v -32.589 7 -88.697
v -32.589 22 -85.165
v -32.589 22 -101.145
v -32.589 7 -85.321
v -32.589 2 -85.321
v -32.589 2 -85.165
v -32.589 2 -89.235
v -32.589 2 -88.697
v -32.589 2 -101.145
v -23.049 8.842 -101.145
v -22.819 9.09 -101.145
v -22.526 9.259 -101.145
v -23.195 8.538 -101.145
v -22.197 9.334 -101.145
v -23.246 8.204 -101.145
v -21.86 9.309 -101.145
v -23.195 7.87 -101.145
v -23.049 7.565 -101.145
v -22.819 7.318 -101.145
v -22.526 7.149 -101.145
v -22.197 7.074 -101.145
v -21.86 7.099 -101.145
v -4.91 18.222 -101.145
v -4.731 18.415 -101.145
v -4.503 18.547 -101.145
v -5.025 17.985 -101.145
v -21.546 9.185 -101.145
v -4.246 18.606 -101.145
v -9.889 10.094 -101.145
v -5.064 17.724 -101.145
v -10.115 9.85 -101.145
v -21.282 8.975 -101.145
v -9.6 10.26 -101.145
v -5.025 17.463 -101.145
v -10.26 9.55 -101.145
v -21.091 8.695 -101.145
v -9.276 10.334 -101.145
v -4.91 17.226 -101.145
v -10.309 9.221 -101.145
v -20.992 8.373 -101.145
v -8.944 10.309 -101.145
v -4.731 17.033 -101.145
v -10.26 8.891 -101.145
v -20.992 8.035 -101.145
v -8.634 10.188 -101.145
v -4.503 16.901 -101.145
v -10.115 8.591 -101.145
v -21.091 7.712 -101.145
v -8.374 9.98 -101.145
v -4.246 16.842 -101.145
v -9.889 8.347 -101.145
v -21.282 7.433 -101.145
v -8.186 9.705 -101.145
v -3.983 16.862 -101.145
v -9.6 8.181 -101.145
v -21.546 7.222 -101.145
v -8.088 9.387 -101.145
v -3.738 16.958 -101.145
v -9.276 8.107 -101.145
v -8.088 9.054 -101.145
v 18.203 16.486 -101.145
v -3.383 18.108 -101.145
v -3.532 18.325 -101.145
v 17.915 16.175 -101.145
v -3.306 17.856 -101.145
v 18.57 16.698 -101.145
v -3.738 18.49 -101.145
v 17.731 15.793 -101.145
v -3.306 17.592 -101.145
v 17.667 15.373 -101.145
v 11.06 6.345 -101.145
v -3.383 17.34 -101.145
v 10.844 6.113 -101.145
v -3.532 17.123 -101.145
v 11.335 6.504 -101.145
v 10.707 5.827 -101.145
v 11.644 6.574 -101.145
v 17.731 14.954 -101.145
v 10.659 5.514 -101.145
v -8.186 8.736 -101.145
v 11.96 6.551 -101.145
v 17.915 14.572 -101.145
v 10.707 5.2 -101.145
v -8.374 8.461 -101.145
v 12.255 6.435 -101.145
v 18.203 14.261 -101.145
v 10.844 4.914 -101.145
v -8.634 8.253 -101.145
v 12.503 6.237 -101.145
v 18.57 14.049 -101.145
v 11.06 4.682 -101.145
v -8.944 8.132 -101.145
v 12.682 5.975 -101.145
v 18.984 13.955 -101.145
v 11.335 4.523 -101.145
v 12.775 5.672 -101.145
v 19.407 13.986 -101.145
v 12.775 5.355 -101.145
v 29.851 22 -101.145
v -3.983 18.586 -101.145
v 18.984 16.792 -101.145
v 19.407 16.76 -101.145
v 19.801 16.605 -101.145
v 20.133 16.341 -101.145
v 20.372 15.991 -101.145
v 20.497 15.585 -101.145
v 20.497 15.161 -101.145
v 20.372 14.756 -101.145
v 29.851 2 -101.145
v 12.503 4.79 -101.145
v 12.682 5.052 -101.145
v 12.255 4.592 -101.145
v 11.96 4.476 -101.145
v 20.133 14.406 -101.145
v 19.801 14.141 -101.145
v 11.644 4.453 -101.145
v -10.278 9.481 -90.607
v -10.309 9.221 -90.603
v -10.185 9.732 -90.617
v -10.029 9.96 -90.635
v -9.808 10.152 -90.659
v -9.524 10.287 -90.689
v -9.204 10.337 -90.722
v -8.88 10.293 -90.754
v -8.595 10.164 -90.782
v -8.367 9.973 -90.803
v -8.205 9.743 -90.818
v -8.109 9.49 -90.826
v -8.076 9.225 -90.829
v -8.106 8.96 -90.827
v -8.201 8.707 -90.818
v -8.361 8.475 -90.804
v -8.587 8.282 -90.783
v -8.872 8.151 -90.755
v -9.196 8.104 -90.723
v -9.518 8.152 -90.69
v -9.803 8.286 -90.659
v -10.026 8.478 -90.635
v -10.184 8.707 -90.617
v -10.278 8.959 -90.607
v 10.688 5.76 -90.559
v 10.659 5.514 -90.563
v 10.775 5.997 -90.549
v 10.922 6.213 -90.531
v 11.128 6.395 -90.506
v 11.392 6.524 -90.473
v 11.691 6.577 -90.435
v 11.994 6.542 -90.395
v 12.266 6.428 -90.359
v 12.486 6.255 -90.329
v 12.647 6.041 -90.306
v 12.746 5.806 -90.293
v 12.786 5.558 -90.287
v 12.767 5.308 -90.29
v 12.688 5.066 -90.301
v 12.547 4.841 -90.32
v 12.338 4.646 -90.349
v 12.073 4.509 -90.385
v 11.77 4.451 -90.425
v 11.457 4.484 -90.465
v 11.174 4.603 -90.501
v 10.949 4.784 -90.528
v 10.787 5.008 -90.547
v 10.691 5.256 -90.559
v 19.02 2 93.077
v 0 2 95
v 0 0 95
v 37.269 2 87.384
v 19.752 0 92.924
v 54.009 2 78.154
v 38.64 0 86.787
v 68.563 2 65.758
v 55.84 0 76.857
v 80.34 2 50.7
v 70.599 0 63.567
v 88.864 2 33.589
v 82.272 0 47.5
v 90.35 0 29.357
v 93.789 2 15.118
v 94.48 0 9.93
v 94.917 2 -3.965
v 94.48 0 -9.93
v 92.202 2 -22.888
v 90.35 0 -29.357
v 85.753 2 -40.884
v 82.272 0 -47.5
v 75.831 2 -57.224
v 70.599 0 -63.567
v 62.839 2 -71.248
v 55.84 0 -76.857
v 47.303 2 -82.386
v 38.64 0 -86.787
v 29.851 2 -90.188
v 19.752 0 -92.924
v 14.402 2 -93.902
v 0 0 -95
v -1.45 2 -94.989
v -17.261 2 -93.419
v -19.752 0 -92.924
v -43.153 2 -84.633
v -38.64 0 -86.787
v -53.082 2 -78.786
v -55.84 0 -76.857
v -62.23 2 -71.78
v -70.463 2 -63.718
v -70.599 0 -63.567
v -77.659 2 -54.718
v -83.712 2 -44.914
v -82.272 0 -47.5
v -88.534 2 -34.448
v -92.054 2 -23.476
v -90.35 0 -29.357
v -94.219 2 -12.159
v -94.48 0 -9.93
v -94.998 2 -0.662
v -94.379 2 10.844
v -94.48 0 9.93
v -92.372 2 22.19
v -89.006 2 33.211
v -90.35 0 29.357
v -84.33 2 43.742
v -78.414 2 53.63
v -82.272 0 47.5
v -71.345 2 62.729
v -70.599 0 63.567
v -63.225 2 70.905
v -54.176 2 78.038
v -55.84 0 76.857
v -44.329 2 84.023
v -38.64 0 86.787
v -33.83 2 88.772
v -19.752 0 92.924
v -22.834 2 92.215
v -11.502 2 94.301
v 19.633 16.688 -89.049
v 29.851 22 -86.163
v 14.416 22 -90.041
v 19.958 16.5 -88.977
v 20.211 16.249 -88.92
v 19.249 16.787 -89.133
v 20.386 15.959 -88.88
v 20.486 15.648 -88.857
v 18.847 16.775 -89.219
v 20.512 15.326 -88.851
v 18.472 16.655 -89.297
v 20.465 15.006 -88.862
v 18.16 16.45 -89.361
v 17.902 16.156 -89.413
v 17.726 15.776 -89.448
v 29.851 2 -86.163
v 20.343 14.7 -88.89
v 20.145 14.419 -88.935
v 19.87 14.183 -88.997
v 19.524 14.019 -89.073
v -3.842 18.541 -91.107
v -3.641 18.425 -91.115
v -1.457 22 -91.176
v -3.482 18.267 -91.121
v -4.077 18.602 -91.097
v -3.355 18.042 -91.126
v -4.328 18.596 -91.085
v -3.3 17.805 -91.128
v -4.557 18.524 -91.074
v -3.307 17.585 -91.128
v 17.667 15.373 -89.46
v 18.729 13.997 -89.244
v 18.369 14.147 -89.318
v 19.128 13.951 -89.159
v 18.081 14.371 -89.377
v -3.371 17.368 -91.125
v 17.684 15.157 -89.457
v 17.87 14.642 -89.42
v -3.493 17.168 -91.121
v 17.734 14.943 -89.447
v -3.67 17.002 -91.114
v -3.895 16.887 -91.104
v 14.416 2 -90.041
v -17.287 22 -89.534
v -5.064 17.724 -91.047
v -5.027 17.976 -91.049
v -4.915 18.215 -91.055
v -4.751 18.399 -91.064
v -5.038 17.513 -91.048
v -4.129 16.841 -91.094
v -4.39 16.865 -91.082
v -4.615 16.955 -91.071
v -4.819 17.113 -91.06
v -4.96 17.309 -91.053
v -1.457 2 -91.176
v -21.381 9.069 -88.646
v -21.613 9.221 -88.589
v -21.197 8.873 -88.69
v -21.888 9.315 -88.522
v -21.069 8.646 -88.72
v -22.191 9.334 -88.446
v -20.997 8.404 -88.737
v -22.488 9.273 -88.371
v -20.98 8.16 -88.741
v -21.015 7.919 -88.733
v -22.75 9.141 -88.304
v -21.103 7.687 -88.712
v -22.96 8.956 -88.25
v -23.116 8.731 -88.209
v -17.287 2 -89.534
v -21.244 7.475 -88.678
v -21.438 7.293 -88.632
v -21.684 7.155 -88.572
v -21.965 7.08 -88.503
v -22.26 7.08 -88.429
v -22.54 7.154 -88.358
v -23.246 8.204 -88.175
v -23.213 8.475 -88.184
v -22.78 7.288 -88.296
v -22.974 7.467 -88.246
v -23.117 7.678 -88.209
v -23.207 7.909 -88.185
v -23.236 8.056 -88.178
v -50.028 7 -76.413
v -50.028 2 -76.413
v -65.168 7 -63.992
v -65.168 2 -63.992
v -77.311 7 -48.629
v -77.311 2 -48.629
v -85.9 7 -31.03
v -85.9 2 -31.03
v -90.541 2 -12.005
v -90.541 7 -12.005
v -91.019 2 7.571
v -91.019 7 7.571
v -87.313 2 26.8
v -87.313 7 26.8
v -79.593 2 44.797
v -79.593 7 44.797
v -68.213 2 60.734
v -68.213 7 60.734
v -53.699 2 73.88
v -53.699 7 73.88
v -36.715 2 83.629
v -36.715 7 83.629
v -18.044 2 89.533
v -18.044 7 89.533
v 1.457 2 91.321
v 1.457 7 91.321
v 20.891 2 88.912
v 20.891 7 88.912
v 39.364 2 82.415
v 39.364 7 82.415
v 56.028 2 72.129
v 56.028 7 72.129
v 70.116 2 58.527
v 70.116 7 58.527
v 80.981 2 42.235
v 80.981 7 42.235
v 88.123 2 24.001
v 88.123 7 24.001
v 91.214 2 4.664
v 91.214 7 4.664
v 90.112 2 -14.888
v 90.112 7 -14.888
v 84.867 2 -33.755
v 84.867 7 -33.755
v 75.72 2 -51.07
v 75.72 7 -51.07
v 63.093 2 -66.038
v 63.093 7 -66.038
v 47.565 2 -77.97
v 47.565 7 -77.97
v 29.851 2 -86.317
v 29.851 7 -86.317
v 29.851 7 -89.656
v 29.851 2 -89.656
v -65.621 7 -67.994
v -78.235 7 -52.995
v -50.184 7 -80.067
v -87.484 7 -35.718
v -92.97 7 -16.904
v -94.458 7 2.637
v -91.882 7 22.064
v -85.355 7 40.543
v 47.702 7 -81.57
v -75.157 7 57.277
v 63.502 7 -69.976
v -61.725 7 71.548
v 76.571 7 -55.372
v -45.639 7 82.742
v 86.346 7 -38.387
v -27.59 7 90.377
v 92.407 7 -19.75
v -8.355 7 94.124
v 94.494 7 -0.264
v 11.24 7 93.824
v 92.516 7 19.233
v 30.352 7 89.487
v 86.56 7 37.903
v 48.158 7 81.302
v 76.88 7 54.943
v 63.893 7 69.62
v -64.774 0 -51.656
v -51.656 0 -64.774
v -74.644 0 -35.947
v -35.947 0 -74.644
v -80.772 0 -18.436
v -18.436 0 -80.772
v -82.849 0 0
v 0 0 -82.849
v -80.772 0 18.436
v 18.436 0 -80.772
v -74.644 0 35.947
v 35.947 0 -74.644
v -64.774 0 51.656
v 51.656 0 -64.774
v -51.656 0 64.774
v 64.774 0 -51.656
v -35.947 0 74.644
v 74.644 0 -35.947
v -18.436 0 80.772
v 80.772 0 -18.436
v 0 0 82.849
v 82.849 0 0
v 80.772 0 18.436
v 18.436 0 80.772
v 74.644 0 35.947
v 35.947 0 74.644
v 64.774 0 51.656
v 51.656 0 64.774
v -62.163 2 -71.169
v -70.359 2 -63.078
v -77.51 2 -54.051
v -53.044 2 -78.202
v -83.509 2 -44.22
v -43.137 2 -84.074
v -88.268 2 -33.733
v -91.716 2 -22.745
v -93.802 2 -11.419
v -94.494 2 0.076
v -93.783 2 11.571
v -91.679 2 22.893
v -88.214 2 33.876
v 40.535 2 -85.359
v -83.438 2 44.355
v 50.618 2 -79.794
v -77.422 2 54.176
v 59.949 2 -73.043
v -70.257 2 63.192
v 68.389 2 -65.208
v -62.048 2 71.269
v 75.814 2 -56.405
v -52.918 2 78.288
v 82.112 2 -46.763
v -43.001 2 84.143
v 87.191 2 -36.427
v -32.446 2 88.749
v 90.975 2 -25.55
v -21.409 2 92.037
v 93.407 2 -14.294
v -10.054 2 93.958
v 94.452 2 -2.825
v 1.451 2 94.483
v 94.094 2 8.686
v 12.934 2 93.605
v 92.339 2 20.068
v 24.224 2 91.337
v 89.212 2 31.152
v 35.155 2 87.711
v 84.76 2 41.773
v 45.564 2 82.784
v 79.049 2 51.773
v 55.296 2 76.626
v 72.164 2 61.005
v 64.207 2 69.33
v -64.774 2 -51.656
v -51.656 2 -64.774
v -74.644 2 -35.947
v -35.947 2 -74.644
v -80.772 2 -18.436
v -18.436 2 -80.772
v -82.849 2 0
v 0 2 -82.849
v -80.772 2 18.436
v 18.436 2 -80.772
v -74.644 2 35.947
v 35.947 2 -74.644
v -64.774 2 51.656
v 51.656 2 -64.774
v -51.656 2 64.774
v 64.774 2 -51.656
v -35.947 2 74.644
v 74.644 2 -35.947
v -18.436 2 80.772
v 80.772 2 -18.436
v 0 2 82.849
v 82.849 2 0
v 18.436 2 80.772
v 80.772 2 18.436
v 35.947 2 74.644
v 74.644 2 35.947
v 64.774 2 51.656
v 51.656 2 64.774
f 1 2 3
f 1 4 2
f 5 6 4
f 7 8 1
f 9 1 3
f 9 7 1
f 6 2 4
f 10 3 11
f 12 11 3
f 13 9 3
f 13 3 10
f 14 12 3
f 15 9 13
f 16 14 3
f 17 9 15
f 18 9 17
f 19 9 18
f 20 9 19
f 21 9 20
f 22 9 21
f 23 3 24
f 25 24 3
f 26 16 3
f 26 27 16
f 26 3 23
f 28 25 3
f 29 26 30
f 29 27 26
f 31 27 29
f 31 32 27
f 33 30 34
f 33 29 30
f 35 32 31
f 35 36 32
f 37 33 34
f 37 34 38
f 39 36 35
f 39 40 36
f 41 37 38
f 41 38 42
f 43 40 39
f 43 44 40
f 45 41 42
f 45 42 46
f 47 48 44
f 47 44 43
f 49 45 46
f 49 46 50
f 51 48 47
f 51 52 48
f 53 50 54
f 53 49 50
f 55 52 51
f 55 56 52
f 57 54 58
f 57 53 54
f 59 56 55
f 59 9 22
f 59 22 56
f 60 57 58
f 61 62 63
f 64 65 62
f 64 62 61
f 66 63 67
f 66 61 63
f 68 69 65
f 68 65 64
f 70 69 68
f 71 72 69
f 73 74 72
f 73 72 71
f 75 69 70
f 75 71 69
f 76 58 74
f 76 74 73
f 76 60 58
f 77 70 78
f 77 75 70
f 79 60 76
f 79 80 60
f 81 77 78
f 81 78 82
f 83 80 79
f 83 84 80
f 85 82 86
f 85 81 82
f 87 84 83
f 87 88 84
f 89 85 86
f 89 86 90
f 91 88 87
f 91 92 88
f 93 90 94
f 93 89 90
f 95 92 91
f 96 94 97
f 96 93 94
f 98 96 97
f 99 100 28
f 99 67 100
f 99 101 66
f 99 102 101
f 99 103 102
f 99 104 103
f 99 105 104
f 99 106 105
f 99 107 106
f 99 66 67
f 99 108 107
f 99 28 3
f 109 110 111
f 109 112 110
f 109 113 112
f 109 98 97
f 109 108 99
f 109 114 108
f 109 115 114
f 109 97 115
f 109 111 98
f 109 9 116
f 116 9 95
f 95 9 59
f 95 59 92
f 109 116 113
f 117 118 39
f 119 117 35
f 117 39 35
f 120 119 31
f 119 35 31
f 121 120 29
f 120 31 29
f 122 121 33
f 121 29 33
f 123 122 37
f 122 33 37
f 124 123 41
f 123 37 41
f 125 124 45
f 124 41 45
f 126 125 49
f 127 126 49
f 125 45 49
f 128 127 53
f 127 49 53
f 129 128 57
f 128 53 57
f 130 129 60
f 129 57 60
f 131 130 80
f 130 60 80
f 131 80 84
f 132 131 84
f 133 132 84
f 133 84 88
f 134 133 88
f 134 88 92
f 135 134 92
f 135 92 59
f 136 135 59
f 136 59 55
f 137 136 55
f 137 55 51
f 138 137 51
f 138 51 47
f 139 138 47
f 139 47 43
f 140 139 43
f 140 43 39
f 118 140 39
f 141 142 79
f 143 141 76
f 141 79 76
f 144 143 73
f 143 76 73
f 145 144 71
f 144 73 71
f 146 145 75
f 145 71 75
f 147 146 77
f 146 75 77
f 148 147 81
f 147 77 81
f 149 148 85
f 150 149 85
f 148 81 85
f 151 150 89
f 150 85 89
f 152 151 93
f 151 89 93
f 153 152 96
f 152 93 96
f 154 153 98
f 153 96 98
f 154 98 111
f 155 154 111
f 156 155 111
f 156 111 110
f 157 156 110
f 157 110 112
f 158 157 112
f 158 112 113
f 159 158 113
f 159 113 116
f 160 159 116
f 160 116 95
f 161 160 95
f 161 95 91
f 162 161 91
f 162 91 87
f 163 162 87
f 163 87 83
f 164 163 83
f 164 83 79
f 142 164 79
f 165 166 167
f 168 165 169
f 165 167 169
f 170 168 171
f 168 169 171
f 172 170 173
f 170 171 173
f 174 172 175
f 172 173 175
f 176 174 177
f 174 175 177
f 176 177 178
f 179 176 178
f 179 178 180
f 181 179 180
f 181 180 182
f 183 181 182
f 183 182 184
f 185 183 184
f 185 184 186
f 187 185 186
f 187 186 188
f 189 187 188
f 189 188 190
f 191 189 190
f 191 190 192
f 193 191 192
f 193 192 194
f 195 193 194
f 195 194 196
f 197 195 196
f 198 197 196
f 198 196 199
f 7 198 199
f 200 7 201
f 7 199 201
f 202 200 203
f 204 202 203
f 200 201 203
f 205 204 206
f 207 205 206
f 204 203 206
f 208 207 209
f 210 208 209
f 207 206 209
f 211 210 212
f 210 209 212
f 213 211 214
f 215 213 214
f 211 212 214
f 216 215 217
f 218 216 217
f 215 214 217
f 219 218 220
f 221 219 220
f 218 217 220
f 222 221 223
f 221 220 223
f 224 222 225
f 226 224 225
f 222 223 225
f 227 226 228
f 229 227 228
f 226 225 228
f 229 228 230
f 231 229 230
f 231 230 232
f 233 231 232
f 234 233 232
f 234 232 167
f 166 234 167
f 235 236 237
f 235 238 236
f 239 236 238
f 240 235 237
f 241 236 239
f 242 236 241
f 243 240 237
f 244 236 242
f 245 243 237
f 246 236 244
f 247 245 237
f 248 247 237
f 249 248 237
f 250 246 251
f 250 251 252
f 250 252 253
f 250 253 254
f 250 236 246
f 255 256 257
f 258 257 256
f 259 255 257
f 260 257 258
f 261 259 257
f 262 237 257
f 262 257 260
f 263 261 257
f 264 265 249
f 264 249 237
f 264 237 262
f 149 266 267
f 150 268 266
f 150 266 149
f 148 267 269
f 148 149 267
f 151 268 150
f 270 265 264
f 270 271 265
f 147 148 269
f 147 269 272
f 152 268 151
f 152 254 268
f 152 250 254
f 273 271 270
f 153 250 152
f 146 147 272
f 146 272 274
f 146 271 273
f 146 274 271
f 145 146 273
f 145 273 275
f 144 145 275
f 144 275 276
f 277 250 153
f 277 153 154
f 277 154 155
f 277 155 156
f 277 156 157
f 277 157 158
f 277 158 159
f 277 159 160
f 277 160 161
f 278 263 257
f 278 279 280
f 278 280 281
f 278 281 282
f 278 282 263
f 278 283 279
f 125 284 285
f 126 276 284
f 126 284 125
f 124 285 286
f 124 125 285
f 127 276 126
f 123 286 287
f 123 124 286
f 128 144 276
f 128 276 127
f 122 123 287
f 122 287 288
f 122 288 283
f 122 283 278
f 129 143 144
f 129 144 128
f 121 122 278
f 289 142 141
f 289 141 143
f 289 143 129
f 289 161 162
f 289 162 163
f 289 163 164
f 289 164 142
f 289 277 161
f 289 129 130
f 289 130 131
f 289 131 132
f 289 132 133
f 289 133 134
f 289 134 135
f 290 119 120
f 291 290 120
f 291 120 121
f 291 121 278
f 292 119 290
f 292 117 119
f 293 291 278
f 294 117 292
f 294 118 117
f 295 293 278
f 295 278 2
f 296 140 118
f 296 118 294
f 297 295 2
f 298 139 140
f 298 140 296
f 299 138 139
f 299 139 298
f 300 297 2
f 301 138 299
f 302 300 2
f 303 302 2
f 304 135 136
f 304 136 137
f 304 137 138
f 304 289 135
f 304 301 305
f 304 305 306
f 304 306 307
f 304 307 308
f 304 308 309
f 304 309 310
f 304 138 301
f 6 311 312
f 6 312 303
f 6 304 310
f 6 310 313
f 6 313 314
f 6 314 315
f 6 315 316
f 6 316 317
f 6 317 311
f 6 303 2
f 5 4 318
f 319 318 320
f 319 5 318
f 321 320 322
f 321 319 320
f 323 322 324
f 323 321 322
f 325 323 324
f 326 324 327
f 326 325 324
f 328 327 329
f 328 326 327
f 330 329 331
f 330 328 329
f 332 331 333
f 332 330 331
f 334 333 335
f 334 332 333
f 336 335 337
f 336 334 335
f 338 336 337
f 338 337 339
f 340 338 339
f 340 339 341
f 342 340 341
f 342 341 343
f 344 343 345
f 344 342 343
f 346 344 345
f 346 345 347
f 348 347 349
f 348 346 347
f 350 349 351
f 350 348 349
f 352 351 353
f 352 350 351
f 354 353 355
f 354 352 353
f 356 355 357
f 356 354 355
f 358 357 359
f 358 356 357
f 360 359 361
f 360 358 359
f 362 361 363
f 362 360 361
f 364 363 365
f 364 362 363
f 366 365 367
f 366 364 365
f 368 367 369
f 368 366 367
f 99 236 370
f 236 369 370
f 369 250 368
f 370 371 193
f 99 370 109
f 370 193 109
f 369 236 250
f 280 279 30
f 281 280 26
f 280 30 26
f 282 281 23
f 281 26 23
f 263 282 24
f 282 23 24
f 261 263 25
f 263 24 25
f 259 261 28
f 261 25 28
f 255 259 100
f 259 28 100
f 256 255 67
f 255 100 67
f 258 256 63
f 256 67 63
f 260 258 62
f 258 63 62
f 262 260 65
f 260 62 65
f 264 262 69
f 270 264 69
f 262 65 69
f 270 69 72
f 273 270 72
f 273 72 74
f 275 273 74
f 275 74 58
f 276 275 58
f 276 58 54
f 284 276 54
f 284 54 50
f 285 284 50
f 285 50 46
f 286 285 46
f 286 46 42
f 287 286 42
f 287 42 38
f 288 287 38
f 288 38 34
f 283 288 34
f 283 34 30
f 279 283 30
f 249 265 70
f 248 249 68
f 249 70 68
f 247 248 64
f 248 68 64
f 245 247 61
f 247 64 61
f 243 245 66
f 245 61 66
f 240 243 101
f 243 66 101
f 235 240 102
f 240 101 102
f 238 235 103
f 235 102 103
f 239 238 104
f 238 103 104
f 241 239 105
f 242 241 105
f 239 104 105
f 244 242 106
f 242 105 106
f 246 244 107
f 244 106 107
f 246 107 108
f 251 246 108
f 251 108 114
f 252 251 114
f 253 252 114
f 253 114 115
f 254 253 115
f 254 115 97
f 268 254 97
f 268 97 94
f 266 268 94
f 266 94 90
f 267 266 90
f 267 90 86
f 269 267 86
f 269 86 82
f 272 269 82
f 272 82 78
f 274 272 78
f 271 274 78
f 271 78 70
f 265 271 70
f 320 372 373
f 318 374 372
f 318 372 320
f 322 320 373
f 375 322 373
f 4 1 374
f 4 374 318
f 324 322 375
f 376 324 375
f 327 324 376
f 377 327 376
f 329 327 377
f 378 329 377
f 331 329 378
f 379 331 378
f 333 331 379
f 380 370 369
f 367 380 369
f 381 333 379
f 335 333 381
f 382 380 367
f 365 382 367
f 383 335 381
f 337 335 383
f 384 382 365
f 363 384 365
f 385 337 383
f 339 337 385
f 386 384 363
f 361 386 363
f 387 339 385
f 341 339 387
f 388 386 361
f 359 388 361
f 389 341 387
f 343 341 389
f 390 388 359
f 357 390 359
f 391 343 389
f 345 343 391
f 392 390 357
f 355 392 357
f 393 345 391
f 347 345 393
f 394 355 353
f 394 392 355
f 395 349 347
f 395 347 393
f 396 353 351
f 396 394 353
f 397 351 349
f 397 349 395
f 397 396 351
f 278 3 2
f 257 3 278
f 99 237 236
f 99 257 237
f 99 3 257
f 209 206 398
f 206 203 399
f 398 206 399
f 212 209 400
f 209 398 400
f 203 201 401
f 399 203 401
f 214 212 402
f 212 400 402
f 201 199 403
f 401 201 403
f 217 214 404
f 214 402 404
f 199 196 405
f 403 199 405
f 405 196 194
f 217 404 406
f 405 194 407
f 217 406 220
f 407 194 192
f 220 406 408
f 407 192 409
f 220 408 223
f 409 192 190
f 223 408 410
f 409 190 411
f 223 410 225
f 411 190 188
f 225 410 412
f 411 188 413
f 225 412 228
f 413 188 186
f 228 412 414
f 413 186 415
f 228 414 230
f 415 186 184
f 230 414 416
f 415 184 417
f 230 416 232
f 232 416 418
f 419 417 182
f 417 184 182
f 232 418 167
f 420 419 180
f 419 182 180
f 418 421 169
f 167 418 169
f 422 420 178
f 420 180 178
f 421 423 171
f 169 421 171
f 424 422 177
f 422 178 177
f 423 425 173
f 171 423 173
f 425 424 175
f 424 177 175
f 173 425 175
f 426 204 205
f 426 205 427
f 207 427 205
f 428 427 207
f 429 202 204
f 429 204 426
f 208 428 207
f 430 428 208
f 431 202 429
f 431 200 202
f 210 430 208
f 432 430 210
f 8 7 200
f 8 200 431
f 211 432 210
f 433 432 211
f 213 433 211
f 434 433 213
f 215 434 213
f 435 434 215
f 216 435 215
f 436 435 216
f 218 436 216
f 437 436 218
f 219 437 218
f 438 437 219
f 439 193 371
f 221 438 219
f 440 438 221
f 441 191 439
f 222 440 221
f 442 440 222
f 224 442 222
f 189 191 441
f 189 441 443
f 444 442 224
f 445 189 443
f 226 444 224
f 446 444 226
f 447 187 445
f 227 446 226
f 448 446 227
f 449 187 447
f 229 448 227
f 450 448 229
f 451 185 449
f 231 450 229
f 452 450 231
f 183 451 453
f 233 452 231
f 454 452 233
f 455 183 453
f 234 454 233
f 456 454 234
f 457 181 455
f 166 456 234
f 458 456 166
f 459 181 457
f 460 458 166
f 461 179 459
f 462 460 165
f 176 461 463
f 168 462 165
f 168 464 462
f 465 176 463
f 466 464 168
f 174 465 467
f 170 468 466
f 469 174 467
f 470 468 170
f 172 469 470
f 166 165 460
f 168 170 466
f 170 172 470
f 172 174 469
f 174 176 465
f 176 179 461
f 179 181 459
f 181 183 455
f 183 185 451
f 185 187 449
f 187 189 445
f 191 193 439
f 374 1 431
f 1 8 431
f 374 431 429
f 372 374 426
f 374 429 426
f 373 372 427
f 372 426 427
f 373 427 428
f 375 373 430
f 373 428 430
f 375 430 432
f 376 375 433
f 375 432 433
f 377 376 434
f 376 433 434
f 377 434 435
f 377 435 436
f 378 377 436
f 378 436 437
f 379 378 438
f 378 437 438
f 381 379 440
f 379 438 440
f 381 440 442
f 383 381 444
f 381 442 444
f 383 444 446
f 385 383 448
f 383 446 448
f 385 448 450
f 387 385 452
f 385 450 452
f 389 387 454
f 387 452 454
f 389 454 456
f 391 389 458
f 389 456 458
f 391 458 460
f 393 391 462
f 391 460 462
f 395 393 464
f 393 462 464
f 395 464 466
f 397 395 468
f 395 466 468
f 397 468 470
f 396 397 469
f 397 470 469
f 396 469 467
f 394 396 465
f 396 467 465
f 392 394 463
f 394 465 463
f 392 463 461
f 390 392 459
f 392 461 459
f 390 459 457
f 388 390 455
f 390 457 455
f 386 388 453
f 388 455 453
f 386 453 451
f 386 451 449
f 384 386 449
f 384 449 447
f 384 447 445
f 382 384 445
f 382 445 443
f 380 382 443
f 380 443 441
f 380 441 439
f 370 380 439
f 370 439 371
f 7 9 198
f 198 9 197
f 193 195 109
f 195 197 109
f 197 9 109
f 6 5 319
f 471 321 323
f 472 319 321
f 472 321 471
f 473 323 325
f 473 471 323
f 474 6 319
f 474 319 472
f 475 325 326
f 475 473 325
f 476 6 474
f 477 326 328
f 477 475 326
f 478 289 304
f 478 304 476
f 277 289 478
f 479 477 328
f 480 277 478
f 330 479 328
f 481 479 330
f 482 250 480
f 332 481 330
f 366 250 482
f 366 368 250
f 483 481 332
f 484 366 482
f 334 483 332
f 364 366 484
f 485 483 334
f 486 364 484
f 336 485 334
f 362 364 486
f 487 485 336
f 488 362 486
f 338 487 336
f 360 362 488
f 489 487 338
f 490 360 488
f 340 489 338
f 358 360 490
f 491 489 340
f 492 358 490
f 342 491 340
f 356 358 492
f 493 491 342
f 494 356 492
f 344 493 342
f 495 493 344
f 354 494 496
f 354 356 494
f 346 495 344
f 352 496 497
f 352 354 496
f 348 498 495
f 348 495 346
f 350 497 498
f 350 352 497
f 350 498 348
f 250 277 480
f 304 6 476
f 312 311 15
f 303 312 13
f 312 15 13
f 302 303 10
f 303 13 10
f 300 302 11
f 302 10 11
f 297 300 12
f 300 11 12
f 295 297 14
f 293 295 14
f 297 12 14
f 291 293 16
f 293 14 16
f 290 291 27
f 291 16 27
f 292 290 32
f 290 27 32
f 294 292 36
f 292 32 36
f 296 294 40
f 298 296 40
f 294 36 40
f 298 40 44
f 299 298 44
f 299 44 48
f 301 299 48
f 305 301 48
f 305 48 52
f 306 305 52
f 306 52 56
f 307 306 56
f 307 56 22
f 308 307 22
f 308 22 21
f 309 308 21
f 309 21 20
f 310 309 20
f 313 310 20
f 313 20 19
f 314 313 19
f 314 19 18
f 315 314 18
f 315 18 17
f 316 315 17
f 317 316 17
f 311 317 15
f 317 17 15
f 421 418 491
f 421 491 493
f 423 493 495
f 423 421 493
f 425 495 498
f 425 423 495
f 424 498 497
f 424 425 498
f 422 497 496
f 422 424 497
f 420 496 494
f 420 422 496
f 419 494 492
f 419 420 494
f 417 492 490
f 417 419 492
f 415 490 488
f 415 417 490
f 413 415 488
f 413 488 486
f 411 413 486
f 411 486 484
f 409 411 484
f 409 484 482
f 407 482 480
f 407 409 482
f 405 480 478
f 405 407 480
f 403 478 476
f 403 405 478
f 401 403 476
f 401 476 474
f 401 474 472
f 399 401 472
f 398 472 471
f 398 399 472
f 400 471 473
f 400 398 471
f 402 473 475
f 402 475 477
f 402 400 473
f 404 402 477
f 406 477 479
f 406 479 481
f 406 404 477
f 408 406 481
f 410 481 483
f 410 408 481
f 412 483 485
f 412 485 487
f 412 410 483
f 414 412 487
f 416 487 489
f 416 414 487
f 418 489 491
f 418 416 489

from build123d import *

# Parameters (mm, degrees)
SKETCH1_R           = 95
SKETCH1_R_2         = 82.849042413
BOSS_EXTRUDE1_DEPTH = 2
SKETCH3_R           = 94.494442109
SKETCH3_R_2         = 91.333084699
BOSS_EXTRUDE2_DEPTH = 5
SKETCH4_W           = 62.439949526
SKETCH4_H           = 16.999481769
BOSS_EXTRUDE3_DEPTH = 20
SKETCH5_R           = 91.187715278
CUT_EXTRUDE1_DEPTH  = 20
SKETCH6_R           = 1.133326697
SKETCH6_R_2         = 0.88409454
SKETCH6_R_3         = 1.06382022
SKETCH6_R_4         = 1.11678576
SKETCH6_R_5         = 1.422635849
CUT_EXTRUDE2_DEPTH  = 25


with BuildPart() as part:
    # Sketch1 → Boss-Extrude1 (new body)
    with BuildSketch(Plane(origin=(0, 0, 0), x_dir=(1, 0, 0), z_dir=(0, 1, 0))):
        with Locations(Location((0, 0, 0), (0, 0, 270))):
            Circle(SKETCH1_R)
        with Locations(Location((0, 0, 0), (0, 0, 270))):
            Circle(SKETCH1_R_2, mode=Mode.SUBTRACT)
    extrude(amount=BOSS_EXTRUDE1_DEPTH)

    # Sketch3 → Boss-Extrude2 (add)
    with BuildSketch(Plane(origin=(0, 2, 0), x_dir=(1, 0, 0), z_dir=(0, 1, 0))):
        with Locations(Location((0, 0, 0), (0, 0, 270))):
            Circle(SKETCH3_R)
        with Locations(Location((0, 0, 0), (0, 0, 270))):
            Circle(SKETCH3_R_2, mode=Mode.SUBTRACT)
    extrude(amount=BOSS_EXTRUDE2_DEPTH)

    # Sketch4 → Boss-Extrude3 (add)
    with BuildSketch(Plane(origin=(0, 2, 0), x_dir=(1, 0, 0), z_dir=(0, 1, 0))):
        with Locations((-1.369214929, 92.645399109)):
            Rectangle(SKETCH4_W, SKETCH4_H)
    extrude(amount=BOSS_EXTRUDE3_DEPTH)

    # Sketch5 → Cut-Extrude1 (cut)
    with BuildSketch(Plane(origin=(0, 2, 0), x_dir=(1, 0, 0), z_dir=(0, 1, 0))):
        Circle(SKETCH5_R)
    extrude(amount=CUT_EXTRUDE1_DEPTH, mode=Mode.SUBTRACT)

    # Sketch6 → Cut-Extrude2 (cut)
    with BuildSketch(Plane(origin=(0, 0, -101.145139993), x_dir=(-1, 0, 0), z_dir=(0, 0, -1))):
        with Locations((22.112365303, 8.203766253)):
            Circle(SKETCH6_R)
        with Locations((4.179872068, 17.724091109)):
            Circle(SKETCH6_R_2)
        with Locations((-11.723213238, 5.51353779)):
            Circle(SKETCH6_R_3)
        with Locations((9.192330575, 9.220604642)):
            Circle(SKETCH6_R_4)
        with Locations((-19.090082193, 15.373412308)):
            Circle(SKETCH6_R_5)
    extrude(amount=-CUT_EXTRUDE2_DEPTH, mode=Mode.SUBTRACT)


solid = part.part
